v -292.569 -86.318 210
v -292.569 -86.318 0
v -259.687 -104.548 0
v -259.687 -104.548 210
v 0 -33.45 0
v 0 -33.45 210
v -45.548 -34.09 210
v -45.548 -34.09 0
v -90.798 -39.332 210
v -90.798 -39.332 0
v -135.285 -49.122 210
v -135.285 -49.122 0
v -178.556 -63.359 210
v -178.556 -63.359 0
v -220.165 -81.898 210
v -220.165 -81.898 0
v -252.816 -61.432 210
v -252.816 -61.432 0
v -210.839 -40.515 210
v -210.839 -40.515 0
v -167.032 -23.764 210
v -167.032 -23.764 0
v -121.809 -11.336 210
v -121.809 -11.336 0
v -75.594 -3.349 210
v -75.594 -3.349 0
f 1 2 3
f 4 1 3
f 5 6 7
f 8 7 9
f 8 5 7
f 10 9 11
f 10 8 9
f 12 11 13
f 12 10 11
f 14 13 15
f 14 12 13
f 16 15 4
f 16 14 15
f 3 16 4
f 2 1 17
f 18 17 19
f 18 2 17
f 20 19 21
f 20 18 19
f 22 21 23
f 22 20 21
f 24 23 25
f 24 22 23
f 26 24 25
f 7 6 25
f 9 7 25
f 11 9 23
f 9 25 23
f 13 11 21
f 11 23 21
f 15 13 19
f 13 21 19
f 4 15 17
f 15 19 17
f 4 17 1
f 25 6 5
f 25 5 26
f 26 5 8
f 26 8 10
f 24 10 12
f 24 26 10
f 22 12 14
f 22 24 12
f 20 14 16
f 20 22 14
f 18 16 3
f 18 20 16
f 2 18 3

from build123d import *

# Parameters (mm, degrees)
BOSS_EXTRUDE1_DEPTH = 210
CUT_EXTRUDE1_REACH  = 379.535
CUT_EXTRUDE2_REACH  = 377.003


with BuildPart() as part:
    # Sketch1 → Boss-Extrude1 (new body)
    with BuildSketch(Plane.XY):
        with BuildLine():
            Line((0, 0), (0, -33.45))
            ThreePointArc((0, -33.45), (-142.866754092, -51.269235769), (-272.793704391, -113.296827807))
            Line((-272.793704391, -113.296827807), (-292.568960472, -86.318285465))
            ThreePointArc((-292.568960472, -86.318285465), (-153.270771234, -19.479665275), (0, 0))
        make_face()
    extrude(amount=BOSS_EXTRUDE1_DEPTH)

    # Sketch3 → Cut-Extrude1 (cut, up to next)
    with BuildSketch(Plane(origin=(0, 0, 0), x_dir=(-1, 0, 0), z_dir=(0, 0, -1)), mode=Mode.PRIVATE) as cut_extrude1_sk1:
        Polygon((292.568960472, -86.318285465), (255.457097019, -106.893394239), (272.793704391, -113.296827807), align=None)
    cut_extrude1_tool1 = extrude(cut_extrude1_sk1.sketch, amount=-CUT_EXTRUDE1_REACH, mode=Mode.PRIVATE) & part.part
    add(cut_extrude1_tool1.solids().sort_by_distance((-273.606587, -102.169503, 0))[0], mode=Mode.SUBTRACT)

    # Sketch4 → Cut-Extrude2 (cut, up to next)
    with BuildSketch(Plane(origin=(0, 0, 0), x_dir=(-1, 0, 0), z_dir=(0, 0, -1)), mode=Mode.PRIVATE) as cut_extrude2_sk1:
        Polygon((0, -33.45), (84.004446004, 0), (0, 0), align=None)
    cut_extrude2_tool1 = extrude(cut_extrude2_sk1.sketch, amount=-CUT_EXTRUDE2_REACH, mode=Mode.PRIVATE) & part.part
    add(cut_extrude2_tool1.solids().sort_by_distance((-28.001482, -11.15, 0))[0], mode=Mode.SUBTRACT)


with BuildPart() as cut_extrude2_kept_piece:
    # of the separate pieces the step leaves, the one the design keeps (cut_extrude2_pieces_kept)
    add(part.part.solids().sort_by_distance((-292.568960472, -86.318285465, 0))[0])


solid = cut_extrude2_kept_piece.part
